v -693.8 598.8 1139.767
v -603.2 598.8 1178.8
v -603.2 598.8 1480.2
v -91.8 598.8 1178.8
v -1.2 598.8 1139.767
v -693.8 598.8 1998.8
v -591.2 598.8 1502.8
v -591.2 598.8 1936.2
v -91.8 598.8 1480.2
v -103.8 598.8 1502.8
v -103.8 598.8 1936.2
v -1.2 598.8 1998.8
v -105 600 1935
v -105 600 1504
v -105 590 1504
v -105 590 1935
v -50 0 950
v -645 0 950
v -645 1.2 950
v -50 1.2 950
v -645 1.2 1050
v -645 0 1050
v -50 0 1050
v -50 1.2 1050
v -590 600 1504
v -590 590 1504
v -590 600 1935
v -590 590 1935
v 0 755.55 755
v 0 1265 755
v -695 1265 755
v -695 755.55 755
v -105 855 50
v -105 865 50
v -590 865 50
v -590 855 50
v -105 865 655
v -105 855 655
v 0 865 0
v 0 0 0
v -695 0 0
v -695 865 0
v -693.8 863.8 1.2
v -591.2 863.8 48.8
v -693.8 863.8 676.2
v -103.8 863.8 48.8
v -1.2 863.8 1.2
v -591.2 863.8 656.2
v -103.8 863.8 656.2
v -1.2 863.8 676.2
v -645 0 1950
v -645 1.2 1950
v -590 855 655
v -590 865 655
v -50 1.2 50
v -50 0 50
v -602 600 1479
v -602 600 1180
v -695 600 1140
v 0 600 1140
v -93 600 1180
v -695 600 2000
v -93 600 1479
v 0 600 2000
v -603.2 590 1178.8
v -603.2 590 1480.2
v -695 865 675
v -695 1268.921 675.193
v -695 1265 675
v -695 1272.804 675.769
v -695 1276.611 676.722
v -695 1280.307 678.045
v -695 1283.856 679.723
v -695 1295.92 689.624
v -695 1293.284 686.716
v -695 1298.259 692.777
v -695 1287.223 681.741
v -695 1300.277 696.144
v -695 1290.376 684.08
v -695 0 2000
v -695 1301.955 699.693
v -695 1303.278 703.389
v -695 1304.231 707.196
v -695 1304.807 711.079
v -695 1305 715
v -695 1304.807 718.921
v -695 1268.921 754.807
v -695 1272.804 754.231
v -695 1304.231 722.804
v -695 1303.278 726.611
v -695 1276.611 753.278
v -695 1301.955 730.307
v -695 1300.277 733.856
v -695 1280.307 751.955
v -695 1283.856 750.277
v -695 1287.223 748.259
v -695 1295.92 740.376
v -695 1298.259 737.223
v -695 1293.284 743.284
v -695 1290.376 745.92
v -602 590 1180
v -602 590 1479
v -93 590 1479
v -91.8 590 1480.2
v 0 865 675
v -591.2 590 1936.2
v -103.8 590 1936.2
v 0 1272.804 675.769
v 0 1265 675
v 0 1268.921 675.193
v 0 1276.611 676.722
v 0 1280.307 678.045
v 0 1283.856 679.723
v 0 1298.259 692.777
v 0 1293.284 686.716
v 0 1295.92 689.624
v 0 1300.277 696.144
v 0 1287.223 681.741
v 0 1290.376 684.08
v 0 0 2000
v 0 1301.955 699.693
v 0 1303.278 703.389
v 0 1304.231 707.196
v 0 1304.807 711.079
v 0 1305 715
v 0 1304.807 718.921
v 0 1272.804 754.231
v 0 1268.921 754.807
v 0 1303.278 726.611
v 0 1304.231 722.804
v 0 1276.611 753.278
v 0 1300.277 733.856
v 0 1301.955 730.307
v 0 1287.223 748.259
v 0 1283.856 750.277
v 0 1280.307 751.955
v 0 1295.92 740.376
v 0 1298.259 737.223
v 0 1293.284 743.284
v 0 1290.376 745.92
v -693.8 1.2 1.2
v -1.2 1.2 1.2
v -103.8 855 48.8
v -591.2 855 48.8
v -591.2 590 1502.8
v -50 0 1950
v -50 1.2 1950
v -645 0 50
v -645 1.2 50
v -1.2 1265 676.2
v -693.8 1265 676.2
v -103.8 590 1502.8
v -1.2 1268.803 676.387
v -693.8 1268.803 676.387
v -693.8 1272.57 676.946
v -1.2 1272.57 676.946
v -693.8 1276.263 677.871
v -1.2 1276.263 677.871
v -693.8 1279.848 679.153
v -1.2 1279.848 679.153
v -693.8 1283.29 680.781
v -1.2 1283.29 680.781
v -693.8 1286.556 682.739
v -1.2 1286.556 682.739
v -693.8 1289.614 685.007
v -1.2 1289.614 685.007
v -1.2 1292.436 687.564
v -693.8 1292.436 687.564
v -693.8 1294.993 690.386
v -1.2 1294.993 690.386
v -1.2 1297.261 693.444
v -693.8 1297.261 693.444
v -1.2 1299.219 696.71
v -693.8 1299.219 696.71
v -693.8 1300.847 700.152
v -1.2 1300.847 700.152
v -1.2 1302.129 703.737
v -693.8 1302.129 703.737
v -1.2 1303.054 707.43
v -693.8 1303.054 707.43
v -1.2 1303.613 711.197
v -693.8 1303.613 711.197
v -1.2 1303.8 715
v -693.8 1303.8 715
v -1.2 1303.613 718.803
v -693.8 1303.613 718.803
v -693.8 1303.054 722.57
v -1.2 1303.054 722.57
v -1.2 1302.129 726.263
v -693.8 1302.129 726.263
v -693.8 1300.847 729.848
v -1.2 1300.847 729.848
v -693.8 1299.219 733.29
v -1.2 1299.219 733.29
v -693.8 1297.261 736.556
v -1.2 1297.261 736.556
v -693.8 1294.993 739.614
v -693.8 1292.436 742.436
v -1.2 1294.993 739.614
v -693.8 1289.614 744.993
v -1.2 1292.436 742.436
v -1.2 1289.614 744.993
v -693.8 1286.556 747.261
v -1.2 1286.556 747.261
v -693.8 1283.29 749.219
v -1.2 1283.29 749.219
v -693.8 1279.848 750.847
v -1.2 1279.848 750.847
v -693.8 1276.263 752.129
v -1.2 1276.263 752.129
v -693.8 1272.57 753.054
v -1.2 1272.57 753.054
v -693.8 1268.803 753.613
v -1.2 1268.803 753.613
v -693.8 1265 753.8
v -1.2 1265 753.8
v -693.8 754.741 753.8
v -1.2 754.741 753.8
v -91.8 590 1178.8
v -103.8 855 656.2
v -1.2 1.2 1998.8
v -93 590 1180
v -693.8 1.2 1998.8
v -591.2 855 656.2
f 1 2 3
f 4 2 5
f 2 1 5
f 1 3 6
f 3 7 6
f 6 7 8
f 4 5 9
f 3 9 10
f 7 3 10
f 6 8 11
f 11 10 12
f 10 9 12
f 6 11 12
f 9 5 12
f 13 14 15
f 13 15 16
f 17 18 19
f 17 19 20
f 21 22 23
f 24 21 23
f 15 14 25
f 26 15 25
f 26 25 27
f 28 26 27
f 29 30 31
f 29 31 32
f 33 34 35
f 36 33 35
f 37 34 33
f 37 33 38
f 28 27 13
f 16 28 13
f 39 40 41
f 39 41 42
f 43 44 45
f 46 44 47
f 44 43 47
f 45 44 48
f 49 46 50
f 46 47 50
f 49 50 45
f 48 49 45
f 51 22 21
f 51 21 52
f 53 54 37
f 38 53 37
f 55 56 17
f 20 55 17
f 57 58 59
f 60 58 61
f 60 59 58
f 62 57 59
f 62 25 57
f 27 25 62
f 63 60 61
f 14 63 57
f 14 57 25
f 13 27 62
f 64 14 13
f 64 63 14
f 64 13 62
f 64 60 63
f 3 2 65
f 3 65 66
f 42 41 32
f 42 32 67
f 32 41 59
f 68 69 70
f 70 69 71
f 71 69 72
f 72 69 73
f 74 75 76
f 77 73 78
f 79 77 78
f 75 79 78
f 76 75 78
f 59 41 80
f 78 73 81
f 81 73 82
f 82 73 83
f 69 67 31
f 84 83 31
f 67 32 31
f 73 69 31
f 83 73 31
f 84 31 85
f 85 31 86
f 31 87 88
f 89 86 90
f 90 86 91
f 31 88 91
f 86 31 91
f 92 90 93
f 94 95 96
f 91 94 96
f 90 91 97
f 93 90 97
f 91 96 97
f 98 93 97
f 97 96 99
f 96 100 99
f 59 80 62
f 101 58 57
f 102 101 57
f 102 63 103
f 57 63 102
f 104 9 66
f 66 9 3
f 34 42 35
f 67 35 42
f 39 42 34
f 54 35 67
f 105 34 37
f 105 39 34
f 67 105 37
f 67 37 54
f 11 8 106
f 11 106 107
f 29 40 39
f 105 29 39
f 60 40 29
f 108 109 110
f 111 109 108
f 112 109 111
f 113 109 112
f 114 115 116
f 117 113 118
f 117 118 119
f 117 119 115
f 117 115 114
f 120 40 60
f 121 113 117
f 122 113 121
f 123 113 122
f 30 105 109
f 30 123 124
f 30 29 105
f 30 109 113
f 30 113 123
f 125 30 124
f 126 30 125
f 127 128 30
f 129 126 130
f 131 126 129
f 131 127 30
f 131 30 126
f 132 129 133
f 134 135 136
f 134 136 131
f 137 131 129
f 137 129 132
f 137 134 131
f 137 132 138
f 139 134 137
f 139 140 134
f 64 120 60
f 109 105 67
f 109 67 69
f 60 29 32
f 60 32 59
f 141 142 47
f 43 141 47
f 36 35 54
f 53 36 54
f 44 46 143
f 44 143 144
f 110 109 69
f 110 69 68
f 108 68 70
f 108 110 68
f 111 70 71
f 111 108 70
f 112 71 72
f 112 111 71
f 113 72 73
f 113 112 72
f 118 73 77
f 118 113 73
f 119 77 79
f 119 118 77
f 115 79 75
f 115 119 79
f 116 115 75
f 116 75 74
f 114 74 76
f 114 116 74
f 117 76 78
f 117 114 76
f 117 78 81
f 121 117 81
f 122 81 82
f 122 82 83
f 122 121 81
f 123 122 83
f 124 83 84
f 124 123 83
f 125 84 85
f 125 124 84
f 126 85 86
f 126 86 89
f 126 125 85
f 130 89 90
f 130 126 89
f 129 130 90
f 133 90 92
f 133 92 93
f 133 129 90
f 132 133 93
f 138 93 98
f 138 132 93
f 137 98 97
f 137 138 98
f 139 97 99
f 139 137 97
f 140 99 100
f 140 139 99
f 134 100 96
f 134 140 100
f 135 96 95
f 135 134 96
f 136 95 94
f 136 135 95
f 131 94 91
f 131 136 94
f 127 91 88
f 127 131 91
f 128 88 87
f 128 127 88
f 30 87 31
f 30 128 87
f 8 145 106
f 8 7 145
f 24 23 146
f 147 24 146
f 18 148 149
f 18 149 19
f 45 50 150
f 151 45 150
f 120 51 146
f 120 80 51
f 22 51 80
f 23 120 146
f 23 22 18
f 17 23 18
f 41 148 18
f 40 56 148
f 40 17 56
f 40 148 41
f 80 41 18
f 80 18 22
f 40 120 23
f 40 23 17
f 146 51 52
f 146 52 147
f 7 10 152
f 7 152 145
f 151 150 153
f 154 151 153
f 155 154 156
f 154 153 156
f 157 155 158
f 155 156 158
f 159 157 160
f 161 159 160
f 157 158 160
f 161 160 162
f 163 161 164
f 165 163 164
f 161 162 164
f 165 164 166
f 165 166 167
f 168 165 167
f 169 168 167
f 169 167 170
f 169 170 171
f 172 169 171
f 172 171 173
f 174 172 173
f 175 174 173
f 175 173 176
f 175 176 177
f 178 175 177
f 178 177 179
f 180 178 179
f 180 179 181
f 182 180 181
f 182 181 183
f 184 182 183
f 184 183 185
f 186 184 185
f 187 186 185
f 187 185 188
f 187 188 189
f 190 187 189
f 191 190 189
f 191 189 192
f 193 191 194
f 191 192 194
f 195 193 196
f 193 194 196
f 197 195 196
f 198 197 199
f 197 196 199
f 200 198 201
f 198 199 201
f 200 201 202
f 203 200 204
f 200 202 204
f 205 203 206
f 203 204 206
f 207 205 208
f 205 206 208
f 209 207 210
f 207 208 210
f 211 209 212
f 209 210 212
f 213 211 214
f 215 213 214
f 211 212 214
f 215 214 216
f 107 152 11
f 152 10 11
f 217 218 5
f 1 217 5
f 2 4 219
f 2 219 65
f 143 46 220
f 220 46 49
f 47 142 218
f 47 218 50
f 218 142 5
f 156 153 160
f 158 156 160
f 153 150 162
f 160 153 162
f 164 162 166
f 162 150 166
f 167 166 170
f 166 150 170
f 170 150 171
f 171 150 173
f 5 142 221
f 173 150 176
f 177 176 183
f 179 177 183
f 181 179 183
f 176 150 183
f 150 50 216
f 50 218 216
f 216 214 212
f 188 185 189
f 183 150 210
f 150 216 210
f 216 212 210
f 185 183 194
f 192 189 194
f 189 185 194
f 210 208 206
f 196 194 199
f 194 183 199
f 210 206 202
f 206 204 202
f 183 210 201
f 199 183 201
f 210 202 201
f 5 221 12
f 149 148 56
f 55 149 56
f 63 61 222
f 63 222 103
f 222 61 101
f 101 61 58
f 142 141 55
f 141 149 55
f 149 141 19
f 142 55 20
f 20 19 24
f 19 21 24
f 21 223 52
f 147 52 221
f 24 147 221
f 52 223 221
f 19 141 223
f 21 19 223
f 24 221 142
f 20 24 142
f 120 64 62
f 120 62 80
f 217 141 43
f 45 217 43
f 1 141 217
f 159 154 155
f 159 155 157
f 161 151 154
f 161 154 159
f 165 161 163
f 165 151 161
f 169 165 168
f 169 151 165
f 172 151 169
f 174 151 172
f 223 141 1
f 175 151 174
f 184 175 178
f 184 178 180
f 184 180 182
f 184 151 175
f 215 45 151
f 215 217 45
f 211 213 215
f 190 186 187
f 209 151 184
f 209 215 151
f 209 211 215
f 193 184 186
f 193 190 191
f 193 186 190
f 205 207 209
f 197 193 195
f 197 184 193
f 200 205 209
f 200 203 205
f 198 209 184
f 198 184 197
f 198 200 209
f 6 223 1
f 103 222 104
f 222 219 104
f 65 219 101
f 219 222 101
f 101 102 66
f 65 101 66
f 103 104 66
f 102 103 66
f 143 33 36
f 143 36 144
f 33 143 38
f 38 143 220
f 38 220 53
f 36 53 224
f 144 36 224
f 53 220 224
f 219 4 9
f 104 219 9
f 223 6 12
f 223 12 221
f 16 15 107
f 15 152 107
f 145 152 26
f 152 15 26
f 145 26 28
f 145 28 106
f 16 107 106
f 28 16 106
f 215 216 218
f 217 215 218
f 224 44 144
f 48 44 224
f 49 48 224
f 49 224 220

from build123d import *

# Parameters (mm, degrees)
F1_DEPTH = 695
F2_W     = 595
F2_H     = 900
F3_DEPTH = 1.2
F4_W     = 509
F4_H     = 299
F5_DEPTH = 10
F4_W_2   = 465
F4_H_2   = 431
F4_W_3   = 10
F6_DEPTH = 10
F7_W     = 465
F7_H     = 605
F7_W_2   = 10
F8_DEPTH = 10
F9_T     = -1.2


# Not quite as in the source:
# - a shell that OpenCascade refuses in one call is made with other operations: the cavity is built on its own and cut out


with BuildPart() as f1:
    # F0 (on Right) → F1 (new body)
    with BuildSketch(Plane.YZ):
        with BuildLine():
            Line((0, 2000), (0, 0))
            Line((0, 0), (865, 0))
            Line((865, 0), (865, 675))
            Line((865, 675), (1265, 675))
            ThreePointArc((1265, 675), (1305, 715), (1265, 755))
            Line((1265, 755), (755.5500969465, 755))
            Line((755.5500969465, 755), (600, 1140))
            Line((600, 1140), (600, 2000))
            Line((600, 2000), (0, 2000))
        make_face()
    extrude(amount=-F1_DEPTH)

    # F2 (on face) → F3 (cut)
    with BuildSketch(Plane.XZ):
        with Locations((-347.5, 1500)):
            Rectangle(F2_W, F2_H)
        with Locations((-347.5, 500)):
            Rectangle(F2_W, F2_H)
    extrude(amount=-F3_DEPTH, mode=Mode.SUBTRACT)

    # F4 (on face) → F5 (cut)
    with BuildSketch(Plane(origin=(0, 600, 0), x_dir=(-1, 0, 0), z_dir=(0, 1, 0))):
        with Locations((347.5, 1329.5)):
            Rectangle(F4_W, F4_H)
    extrude(amount=-F5_DEPTH, mode=Mode.SUBTRACT)

    # F4 (on face) → F6 (cut)
    with BuildSketch(Plane(origin=(0, 600, 0), x_dir=(-1, 0, 0), z_dir=(0, 1, 0))):
        with Locations((347.5, 1719.5)):
            Rectangle(F4_W_2, F4_H_2)
        with Locations((110, 1719.5)):
            Rectangle(F4_W_3, F4_H_2)
        with Locations((585, 1719.5)):
            Rectangle(F4_W_3, F4_H_2)
    extrude(amount=-F6_DEPTH, mode=Mode.SUBTRACT)

    # F7 (on face) → F8 (cut)
    with BuildSketch(Plane(origin=(0, 865, 0), x_dir=(-1, 0, 0), z_dir=(0, 1, 0))):
        with Locations((347.5, 352.5)):
            Rectangle(F7_W, F7_H)
        with Locations((110, 352.5)):
            Rectangle(F7_W_2, F7_H)
        with Locations((585, 352.5)):
            Rectangle(F7_W_2, F7_H)
    extrude(amount=-F8_DEPTH, mode=Mode.SUBTRACT)

    # F9: a shell. OpenCascade refuses it in one call, so the cavity is built on its own and cut out:
    # the body offset inwards by the wall thickness, plus a prism from it out through each open face.
    f9_core = offset(f1.part, amount=F9_T, kind=Kind.INTERSECTION, mode=Mode.PRIVATE)
    f9_exits = [f9_core.faces().sort_by_distance(p)[0] for p in [
        (-347.5, 588.8, 1719.5),
        (-347.5, 588.8, 1329.5),
        (-347.5, 853.8, 352.5),
        (-347.5, 2.4, 500),
        (-347.5, 2.4, 1500),
    ]]
    add(f9_core, mode=Mode.SUBTRACT)
    extrude(f9_exits, amount=-F9_T, mode=Mode.SUBTRACT)


solid = f1.part
